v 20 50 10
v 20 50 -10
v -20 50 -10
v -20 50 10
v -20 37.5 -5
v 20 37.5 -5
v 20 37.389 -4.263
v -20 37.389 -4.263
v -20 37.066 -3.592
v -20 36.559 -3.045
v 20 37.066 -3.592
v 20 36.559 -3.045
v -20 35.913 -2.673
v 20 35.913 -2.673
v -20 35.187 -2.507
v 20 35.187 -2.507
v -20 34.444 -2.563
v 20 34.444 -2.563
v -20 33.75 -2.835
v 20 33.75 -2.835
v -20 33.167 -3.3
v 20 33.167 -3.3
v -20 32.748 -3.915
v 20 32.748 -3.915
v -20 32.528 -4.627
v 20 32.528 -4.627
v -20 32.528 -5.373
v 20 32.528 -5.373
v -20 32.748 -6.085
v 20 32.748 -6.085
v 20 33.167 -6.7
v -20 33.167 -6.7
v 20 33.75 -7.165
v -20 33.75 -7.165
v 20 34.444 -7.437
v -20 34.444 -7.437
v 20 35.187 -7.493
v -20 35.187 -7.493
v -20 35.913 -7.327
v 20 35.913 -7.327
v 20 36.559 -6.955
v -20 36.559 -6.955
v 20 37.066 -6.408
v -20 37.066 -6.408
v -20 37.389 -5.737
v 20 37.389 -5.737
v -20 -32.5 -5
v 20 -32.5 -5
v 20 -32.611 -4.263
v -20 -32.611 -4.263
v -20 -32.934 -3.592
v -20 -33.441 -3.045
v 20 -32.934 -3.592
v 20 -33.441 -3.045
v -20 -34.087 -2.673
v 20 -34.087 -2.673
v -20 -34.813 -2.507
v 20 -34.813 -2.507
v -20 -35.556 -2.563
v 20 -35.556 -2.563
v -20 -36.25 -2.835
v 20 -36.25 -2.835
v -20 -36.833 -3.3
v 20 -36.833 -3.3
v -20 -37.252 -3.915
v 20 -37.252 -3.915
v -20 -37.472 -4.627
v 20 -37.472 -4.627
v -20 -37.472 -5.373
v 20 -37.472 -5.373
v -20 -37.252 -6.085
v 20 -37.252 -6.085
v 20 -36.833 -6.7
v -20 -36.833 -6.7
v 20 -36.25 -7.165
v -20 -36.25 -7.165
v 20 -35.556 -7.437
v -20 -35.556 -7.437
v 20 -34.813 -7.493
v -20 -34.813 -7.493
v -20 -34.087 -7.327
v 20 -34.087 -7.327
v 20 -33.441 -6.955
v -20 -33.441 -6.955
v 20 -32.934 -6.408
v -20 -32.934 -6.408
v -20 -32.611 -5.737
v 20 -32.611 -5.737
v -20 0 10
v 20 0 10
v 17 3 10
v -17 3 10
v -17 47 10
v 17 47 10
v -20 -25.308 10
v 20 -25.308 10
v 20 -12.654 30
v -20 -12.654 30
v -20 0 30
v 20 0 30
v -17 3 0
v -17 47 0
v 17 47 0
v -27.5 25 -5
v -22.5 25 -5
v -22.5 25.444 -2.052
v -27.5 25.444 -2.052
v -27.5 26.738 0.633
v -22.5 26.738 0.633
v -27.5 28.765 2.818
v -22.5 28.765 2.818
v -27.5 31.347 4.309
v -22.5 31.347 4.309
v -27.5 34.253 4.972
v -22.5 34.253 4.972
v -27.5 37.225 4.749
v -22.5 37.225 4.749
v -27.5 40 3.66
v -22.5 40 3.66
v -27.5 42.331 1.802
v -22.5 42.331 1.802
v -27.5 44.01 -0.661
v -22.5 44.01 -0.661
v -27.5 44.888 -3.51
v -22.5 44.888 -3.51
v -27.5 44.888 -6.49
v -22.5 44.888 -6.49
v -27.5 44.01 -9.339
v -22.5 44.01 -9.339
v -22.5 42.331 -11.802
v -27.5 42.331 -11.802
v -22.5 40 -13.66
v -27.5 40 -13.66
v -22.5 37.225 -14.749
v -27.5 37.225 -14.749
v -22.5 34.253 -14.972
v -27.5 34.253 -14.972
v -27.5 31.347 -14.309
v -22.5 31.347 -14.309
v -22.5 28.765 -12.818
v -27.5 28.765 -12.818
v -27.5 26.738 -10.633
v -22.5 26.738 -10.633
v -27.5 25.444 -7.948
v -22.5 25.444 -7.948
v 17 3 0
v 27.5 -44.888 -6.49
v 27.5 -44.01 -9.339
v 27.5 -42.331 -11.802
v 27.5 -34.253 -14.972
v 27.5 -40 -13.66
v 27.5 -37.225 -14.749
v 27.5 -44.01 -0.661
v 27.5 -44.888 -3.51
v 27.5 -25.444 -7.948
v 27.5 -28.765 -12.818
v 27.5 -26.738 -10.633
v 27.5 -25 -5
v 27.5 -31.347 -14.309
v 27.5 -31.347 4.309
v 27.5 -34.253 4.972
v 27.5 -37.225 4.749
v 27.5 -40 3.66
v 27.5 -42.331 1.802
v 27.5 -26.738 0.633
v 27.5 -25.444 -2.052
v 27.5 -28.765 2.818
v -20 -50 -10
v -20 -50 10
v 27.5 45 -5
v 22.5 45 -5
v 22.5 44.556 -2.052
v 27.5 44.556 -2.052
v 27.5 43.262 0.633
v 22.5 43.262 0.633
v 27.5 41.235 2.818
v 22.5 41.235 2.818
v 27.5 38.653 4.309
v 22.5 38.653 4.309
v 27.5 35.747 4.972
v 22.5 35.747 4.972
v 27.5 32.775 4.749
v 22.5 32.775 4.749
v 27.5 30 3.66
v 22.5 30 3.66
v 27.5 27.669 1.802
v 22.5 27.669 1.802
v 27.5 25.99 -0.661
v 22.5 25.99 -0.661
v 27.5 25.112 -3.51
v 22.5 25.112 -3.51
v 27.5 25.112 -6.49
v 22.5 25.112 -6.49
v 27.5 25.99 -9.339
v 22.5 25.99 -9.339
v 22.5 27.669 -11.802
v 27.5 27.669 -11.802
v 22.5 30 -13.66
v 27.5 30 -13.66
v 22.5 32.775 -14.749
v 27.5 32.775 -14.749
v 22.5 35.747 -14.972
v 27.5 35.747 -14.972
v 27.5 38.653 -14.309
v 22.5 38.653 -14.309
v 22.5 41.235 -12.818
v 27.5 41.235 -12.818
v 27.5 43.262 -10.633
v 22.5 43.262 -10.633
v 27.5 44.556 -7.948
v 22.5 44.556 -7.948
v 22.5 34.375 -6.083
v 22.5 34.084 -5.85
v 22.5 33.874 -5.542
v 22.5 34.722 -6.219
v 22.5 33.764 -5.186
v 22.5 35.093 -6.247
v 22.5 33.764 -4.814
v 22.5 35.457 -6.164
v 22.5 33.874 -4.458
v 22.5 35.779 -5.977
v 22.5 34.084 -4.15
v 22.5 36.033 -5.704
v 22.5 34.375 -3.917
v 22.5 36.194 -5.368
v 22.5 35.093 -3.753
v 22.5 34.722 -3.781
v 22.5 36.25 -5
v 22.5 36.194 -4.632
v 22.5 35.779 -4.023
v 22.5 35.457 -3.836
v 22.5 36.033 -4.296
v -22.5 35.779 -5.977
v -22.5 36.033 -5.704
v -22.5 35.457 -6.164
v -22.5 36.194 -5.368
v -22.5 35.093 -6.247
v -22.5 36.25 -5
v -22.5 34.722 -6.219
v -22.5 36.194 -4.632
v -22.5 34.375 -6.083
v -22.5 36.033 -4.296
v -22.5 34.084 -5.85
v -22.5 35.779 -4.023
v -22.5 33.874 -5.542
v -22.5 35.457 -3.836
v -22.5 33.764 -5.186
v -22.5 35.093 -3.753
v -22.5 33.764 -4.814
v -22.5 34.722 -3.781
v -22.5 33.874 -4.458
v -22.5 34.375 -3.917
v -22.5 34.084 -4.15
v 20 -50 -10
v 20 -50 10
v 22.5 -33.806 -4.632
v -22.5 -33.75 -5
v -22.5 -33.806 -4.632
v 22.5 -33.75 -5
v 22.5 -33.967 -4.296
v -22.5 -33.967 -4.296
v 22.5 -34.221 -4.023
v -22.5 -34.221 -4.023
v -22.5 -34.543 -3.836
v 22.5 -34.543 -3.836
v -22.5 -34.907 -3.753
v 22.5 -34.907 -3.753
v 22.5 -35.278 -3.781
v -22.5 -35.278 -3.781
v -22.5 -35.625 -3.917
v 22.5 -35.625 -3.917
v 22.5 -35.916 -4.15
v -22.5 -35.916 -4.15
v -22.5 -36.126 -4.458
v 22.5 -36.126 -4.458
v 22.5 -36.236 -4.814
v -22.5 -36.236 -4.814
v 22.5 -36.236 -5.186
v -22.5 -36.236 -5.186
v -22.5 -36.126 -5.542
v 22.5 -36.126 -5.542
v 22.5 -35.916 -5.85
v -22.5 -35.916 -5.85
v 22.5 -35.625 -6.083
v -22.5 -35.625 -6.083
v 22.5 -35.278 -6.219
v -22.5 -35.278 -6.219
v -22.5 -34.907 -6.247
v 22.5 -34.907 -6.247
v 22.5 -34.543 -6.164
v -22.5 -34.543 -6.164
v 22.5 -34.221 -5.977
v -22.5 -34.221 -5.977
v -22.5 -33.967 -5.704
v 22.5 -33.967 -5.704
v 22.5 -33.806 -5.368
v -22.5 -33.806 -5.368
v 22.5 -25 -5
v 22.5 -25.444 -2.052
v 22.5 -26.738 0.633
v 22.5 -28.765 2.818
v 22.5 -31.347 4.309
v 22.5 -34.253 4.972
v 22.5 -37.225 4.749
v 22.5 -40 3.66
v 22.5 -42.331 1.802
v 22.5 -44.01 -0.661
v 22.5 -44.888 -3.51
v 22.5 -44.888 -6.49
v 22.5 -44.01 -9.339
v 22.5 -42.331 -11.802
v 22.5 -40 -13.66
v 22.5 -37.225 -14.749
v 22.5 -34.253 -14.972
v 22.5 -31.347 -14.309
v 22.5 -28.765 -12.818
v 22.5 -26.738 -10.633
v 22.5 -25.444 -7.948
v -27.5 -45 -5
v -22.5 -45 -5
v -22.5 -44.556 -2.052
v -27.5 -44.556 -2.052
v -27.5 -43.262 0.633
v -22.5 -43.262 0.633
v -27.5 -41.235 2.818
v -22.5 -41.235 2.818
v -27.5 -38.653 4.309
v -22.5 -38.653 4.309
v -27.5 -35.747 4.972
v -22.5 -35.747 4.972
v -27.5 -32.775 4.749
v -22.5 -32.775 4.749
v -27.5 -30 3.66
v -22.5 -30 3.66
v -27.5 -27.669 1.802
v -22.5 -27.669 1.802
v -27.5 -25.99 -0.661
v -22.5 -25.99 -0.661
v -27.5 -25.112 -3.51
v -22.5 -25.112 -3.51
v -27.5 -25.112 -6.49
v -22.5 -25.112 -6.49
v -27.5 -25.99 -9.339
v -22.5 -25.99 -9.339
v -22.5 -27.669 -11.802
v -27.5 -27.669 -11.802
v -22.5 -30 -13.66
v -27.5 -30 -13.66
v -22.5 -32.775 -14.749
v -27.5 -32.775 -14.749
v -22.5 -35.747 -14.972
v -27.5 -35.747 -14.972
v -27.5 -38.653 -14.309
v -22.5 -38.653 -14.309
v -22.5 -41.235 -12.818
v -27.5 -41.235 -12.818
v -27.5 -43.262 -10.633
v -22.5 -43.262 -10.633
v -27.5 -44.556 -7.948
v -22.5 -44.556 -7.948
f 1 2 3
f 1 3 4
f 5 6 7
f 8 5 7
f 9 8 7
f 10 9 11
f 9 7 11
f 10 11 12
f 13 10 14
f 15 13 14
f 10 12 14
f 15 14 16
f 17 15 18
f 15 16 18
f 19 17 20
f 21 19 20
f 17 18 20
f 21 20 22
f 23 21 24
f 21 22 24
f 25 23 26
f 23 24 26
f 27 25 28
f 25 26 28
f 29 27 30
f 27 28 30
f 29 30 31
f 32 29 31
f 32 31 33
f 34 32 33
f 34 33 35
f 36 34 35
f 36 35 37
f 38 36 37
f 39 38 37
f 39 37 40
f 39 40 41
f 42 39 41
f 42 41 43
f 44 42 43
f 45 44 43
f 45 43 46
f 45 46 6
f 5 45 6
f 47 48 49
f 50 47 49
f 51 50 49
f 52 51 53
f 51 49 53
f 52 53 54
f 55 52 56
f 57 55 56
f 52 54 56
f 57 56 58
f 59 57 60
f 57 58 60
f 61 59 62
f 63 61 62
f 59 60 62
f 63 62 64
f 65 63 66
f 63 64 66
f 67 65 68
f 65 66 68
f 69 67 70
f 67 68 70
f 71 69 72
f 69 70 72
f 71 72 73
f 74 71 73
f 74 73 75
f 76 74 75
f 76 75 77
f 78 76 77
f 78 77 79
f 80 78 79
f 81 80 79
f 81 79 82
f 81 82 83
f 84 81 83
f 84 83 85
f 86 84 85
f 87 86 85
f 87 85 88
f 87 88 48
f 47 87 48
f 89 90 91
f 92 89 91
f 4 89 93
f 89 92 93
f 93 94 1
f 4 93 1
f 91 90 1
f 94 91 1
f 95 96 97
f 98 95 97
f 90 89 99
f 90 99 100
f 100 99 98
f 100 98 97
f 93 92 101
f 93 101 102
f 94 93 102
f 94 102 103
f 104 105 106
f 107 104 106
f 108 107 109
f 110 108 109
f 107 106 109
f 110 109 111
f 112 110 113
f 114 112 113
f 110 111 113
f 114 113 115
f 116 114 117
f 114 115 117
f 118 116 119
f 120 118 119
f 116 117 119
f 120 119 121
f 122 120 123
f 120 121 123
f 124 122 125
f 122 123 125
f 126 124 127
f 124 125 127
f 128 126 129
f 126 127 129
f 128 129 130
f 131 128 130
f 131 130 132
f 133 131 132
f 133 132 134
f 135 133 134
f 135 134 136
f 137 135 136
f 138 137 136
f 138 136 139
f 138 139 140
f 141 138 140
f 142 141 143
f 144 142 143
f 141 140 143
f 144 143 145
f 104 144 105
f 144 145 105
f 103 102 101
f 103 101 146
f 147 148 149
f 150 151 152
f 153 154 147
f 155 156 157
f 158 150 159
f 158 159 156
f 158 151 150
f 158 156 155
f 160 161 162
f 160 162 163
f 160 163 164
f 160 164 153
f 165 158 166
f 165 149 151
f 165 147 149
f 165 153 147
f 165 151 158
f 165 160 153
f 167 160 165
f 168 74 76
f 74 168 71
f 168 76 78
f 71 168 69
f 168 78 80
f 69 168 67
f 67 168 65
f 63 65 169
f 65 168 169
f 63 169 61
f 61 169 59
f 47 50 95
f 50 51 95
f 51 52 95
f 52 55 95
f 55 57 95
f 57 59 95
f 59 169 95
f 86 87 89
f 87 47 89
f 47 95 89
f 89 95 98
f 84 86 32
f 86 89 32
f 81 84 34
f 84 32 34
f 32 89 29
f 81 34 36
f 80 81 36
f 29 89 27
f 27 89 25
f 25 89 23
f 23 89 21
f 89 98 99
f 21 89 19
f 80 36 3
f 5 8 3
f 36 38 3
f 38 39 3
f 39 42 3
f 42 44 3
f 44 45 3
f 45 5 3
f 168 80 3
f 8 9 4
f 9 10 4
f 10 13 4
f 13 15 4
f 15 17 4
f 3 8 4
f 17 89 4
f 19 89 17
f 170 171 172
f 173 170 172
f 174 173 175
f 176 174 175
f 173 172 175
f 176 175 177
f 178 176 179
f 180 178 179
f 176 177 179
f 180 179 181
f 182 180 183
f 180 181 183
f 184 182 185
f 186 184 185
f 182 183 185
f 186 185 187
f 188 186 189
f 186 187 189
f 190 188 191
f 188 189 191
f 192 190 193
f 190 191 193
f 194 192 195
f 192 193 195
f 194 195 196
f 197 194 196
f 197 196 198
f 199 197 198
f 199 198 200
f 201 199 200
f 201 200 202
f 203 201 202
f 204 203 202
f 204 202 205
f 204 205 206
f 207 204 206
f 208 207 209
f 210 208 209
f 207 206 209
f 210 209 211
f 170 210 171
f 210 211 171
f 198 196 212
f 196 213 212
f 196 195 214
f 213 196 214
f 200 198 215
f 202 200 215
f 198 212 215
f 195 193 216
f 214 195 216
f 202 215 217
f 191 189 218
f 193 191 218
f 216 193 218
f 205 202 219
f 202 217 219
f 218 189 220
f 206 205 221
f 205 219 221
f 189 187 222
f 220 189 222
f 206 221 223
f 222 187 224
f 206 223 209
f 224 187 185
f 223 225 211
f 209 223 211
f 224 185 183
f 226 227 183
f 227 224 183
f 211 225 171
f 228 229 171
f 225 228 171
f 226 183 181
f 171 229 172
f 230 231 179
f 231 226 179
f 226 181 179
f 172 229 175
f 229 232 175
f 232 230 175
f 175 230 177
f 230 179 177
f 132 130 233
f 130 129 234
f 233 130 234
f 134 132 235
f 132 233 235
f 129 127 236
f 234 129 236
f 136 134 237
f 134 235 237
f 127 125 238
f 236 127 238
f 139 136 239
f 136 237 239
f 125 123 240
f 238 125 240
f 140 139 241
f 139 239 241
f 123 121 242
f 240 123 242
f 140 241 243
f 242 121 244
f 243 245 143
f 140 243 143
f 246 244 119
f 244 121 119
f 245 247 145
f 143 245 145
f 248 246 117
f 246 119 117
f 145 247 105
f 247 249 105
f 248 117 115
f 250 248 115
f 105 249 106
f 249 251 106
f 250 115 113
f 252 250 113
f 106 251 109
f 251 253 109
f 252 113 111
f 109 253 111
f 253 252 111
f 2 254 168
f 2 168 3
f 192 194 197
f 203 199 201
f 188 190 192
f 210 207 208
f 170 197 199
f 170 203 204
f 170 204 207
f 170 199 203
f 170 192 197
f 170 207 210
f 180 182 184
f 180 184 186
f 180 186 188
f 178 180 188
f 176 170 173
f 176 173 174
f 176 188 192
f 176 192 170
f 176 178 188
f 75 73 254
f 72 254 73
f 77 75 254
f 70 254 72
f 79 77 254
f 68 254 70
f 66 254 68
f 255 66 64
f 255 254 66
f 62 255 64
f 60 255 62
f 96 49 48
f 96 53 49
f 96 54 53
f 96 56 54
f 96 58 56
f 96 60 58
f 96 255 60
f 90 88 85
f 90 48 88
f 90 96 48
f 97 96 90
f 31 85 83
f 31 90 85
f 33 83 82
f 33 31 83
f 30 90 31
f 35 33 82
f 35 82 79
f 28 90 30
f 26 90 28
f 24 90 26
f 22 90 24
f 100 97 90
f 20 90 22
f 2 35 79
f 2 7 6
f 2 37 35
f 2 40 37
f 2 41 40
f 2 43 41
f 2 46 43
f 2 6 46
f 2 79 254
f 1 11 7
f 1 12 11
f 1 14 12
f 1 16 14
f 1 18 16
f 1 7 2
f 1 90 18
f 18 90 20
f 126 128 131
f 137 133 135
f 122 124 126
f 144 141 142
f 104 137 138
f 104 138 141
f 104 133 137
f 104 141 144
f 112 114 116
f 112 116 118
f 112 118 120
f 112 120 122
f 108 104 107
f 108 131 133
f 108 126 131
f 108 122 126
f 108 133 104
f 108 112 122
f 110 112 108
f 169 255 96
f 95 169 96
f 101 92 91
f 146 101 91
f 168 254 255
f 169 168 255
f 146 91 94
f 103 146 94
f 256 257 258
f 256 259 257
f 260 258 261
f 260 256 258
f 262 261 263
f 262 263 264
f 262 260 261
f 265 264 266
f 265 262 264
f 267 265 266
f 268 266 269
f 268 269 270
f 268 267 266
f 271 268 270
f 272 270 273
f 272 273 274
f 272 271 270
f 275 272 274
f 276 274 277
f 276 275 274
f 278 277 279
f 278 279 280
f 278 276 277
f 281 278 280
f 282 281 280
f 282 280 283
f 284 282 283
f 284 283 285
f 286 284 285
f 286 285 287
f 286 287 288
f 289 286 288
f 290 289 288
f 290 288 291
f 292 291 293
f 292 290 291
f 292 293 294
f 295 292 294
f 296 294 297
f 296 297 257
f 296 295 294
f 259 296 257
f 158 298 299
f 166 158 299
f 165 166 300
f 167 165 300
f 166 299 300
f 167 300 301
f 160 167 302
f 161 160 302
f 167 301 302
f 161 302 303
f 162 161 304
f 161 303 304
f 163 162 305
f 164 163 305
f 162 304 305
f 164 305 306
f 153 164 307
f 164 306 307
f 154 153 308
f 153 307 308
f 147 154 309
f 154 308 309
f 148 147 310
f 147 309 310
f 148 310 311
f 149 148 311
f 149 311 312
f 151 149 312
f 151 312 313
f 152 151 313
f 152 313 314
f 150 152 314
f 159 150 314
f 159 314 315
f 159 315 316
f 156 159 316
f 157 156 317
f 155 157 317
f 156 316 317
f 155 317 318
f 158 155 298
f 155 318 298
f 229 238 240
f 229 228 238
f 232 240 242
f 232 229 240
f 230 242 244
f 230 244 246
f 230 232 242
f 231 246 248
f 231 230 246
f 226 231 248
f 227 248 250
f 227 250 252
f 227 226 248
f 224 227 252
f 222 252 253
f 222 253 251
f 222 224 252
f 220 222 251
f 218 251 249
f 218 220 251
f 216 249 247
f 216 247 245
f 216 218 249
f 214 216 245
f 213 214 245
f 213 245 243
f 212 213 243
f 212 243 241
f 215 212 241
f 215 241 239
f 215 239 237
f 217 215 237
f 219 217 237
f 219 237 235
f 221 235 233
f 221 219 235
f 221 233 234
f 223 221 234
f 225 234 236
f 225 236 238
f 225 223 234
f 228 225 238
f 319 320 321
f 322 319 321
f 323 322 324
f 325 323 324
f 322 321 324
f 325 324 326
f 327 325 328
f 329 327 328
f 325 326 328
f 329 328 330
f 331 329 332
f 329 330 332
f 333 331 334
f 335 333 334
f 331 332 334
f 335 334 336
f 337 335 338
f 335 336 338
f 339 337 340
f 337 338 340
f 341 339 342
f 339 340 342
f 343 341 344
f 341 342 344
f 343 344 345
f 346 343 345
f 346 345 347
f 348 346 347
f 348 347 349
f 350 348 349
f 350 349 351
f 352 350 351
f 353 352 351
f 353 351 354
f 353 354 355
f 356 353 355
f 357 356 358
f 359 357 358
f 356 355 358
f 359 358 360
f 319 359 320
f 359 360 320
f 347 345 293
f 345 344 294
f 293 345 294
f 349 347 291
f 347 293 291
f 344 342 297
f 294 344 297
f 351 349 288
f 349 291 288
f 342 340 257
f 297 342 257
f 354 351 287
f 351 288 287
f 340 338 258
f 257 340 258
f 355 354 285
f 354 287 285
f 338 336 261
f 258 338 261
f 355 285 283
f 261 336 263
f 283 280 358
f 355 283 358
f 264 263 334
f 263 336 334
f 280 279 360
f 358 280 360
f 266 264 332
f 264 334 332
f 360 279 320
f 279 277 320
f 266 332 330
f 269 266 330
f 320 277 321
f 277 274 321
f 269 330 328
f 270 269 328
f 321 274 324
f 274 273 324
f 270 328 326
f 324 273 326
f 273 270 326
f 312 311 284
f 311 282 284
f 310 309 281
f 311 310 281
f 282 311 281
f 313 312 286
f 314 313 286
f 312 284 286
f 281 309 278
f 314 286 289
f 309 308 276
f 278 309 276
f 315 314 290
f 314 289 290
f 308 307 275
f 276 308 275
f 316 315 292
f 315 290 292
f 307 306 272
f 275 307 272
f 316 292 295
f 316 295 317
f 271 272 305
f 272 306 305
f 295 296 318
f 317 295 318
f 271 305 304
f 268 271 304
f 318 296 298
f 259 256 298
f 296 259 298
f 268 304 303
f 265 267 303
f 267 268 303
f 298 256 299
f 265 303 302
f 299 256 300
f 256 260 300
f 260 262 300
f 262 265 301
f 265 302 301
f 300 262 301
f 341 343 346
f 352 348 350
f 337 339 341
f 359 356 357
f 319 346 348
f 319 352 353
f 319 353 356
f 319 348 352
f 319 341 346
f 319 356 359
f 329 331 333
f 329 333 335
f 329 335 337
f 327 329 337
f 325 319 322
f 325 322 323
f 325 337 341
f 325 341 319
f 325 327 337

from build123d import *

# Parameters (mm, degrees)
F0_W       = 100
F0_H       = 20
F1_DEPTH   = 20
F4_W       = 40
F4_H       = 25.30775
F5_DEPTH   = 20
F9_DEPTH   = 40
F10_R      = 2.5
F11_DEPTH  = 40.001
F12_R      = 2.5
F13_DEPTH  = 40.001
F14_W      = 34
F14_H      = 44
F15_DEPTH  = 10
F16_R      = 1.25
F17_DEPTH  = 42.5
F17_FACE_R = 1.25
F18_DEPTH  = 2.5
F19_R      = 1.25
F20_DEPTH  = 42.5
F20_FACE_R = 1.25
F21_DEPTH  = 2.5
F22_R      = 10
F23_DEPTH  = 5
F24_R      = 10
F25_DEPTH  = 5
F26_R      = 10
F27_DEPTH  = 5
F28_R      = 10
F29_DEPTH  = 5


with BuildPart() as f1:
    # F0 (on Right) → F1 (new body, symmetric)
    with BuildSketch(Plane.YZ):
        Rectangle(F0_W, F0_H)
    extrude(amount=F1_DEPTH, both=True)

    # F4 (on face) → F5 (join)
    with BuildSketch(Plane.XY.offset(10)):
        with Locations((0, -12.653875)):
            Rectangle(F4_W, F4_H)
    extrude(amount=F5_DEPTH)

    # F7 (on face) → F9 (cut)
    with BuildSketch(Plane.YZ.offset(20)):
        Polygon((-25.30775, 30), (-25.30775, 10), (-12.653875, 30), align=None)
    extrude(amount=-F9_DEPTH, mode=Mode.SUBTRACT)

    # F10 (on face) → F11 (cut, through all)
    with BuildSketch(Plane.YZ.offset(20)):
        with Locations((-35, -5)):
            Circle(F10_R)
    extrude(amount=-F11_DEPTH, mode=Mode.SUBTRACT)

    # F12 (on face) → F13 (cut, through all)
    with BuildSketch(Plane.YZ.offset(20)):
        with Locations((35, -5)):
            Circle(F12_R)
    extrude(amount=-F13_DEPTH, mode=Mode.SUBTRACT)

    # F14 (on face) → F15 (cut)
    with BuildSketch(Plane.XY.offset(10)):
        with Locations((0, 25)):
            Rectangle(F14_W, F14_H)
    extrude(amount=-F15_DEPTH, mode=Mode.SUBTRACT)


with BuildPart() as f17:
    # F16 (on face) → F17 (new body)
    with BuildSketch(Plane.YZ.offset(20)):
        with Locations((-35, -5)):
            Circle(F16_R)
    extrude(amount=-F17_DEPTH)

    # F17_face (on face) → F18 (join)
    with BuildSketch(Plane(origin=(20, -35, -5), x_dir=(0, 1, 0), z_dir=(1, 0, 0))):
        Circle(F17_FACE_R)
    extrude(amount=F18_DEPTH)

    # F22 (on face) → F23 (join)
    with BuildSketch(Plane.YZ.offset(22.5)):
        with Locations((-35, -5)):
            Circle(F22_R)
    extrude(amount=F23_DEPTH)

    # F24 (on face) → F25 (join)
    with BuildSketch(Plane(origin=(-22.5, 0, 0), x_dir=(0, -1, 0), z_dir=(-1, 0, 0))):
        with Locations((35, -5)):
            Circle(F24_R)
    extrude(amount=F25_DEPTH)


with BuildPart() as f20:
    # F19 (on face) → F20 (new body)
    with BuildSketch(Plane.YZ.offset(20)):
        with Locations((35, -5)):
            Circle(F19_R)
    extrude(amount=-F20_DEPTH)

    # F20_face (on face) → F21 (join)
    with BuildSketch(Plane(origin=(20, 35, -5), x_dir=(0, 1, 0), z_dir=(1, 0, 0))):
        Circle(F20_FACE_R)
    extrude(amount=F21_DEPTH)

    # F26 (on face) → F27 (join)
    with BuildSketch(Plane(origin=(-22.5, 0, 0), x_dir=(0, -1, 0), z_dir=(-1, 0, 0))):
        with Locations((-35, -5)):
            Circle(F26_R)
    extrude(amount=F27_DEPTH)

    # F28 (on face) → F29 (join)
    with BuildSketch(Plane.YZ.offset(22.5)):
        with Locations((35, -5)):
            Circle(F28_R)
    extrude(amount=F29_DEPTH)


solid = Compound([f1.part, f17.part, f20.part])
